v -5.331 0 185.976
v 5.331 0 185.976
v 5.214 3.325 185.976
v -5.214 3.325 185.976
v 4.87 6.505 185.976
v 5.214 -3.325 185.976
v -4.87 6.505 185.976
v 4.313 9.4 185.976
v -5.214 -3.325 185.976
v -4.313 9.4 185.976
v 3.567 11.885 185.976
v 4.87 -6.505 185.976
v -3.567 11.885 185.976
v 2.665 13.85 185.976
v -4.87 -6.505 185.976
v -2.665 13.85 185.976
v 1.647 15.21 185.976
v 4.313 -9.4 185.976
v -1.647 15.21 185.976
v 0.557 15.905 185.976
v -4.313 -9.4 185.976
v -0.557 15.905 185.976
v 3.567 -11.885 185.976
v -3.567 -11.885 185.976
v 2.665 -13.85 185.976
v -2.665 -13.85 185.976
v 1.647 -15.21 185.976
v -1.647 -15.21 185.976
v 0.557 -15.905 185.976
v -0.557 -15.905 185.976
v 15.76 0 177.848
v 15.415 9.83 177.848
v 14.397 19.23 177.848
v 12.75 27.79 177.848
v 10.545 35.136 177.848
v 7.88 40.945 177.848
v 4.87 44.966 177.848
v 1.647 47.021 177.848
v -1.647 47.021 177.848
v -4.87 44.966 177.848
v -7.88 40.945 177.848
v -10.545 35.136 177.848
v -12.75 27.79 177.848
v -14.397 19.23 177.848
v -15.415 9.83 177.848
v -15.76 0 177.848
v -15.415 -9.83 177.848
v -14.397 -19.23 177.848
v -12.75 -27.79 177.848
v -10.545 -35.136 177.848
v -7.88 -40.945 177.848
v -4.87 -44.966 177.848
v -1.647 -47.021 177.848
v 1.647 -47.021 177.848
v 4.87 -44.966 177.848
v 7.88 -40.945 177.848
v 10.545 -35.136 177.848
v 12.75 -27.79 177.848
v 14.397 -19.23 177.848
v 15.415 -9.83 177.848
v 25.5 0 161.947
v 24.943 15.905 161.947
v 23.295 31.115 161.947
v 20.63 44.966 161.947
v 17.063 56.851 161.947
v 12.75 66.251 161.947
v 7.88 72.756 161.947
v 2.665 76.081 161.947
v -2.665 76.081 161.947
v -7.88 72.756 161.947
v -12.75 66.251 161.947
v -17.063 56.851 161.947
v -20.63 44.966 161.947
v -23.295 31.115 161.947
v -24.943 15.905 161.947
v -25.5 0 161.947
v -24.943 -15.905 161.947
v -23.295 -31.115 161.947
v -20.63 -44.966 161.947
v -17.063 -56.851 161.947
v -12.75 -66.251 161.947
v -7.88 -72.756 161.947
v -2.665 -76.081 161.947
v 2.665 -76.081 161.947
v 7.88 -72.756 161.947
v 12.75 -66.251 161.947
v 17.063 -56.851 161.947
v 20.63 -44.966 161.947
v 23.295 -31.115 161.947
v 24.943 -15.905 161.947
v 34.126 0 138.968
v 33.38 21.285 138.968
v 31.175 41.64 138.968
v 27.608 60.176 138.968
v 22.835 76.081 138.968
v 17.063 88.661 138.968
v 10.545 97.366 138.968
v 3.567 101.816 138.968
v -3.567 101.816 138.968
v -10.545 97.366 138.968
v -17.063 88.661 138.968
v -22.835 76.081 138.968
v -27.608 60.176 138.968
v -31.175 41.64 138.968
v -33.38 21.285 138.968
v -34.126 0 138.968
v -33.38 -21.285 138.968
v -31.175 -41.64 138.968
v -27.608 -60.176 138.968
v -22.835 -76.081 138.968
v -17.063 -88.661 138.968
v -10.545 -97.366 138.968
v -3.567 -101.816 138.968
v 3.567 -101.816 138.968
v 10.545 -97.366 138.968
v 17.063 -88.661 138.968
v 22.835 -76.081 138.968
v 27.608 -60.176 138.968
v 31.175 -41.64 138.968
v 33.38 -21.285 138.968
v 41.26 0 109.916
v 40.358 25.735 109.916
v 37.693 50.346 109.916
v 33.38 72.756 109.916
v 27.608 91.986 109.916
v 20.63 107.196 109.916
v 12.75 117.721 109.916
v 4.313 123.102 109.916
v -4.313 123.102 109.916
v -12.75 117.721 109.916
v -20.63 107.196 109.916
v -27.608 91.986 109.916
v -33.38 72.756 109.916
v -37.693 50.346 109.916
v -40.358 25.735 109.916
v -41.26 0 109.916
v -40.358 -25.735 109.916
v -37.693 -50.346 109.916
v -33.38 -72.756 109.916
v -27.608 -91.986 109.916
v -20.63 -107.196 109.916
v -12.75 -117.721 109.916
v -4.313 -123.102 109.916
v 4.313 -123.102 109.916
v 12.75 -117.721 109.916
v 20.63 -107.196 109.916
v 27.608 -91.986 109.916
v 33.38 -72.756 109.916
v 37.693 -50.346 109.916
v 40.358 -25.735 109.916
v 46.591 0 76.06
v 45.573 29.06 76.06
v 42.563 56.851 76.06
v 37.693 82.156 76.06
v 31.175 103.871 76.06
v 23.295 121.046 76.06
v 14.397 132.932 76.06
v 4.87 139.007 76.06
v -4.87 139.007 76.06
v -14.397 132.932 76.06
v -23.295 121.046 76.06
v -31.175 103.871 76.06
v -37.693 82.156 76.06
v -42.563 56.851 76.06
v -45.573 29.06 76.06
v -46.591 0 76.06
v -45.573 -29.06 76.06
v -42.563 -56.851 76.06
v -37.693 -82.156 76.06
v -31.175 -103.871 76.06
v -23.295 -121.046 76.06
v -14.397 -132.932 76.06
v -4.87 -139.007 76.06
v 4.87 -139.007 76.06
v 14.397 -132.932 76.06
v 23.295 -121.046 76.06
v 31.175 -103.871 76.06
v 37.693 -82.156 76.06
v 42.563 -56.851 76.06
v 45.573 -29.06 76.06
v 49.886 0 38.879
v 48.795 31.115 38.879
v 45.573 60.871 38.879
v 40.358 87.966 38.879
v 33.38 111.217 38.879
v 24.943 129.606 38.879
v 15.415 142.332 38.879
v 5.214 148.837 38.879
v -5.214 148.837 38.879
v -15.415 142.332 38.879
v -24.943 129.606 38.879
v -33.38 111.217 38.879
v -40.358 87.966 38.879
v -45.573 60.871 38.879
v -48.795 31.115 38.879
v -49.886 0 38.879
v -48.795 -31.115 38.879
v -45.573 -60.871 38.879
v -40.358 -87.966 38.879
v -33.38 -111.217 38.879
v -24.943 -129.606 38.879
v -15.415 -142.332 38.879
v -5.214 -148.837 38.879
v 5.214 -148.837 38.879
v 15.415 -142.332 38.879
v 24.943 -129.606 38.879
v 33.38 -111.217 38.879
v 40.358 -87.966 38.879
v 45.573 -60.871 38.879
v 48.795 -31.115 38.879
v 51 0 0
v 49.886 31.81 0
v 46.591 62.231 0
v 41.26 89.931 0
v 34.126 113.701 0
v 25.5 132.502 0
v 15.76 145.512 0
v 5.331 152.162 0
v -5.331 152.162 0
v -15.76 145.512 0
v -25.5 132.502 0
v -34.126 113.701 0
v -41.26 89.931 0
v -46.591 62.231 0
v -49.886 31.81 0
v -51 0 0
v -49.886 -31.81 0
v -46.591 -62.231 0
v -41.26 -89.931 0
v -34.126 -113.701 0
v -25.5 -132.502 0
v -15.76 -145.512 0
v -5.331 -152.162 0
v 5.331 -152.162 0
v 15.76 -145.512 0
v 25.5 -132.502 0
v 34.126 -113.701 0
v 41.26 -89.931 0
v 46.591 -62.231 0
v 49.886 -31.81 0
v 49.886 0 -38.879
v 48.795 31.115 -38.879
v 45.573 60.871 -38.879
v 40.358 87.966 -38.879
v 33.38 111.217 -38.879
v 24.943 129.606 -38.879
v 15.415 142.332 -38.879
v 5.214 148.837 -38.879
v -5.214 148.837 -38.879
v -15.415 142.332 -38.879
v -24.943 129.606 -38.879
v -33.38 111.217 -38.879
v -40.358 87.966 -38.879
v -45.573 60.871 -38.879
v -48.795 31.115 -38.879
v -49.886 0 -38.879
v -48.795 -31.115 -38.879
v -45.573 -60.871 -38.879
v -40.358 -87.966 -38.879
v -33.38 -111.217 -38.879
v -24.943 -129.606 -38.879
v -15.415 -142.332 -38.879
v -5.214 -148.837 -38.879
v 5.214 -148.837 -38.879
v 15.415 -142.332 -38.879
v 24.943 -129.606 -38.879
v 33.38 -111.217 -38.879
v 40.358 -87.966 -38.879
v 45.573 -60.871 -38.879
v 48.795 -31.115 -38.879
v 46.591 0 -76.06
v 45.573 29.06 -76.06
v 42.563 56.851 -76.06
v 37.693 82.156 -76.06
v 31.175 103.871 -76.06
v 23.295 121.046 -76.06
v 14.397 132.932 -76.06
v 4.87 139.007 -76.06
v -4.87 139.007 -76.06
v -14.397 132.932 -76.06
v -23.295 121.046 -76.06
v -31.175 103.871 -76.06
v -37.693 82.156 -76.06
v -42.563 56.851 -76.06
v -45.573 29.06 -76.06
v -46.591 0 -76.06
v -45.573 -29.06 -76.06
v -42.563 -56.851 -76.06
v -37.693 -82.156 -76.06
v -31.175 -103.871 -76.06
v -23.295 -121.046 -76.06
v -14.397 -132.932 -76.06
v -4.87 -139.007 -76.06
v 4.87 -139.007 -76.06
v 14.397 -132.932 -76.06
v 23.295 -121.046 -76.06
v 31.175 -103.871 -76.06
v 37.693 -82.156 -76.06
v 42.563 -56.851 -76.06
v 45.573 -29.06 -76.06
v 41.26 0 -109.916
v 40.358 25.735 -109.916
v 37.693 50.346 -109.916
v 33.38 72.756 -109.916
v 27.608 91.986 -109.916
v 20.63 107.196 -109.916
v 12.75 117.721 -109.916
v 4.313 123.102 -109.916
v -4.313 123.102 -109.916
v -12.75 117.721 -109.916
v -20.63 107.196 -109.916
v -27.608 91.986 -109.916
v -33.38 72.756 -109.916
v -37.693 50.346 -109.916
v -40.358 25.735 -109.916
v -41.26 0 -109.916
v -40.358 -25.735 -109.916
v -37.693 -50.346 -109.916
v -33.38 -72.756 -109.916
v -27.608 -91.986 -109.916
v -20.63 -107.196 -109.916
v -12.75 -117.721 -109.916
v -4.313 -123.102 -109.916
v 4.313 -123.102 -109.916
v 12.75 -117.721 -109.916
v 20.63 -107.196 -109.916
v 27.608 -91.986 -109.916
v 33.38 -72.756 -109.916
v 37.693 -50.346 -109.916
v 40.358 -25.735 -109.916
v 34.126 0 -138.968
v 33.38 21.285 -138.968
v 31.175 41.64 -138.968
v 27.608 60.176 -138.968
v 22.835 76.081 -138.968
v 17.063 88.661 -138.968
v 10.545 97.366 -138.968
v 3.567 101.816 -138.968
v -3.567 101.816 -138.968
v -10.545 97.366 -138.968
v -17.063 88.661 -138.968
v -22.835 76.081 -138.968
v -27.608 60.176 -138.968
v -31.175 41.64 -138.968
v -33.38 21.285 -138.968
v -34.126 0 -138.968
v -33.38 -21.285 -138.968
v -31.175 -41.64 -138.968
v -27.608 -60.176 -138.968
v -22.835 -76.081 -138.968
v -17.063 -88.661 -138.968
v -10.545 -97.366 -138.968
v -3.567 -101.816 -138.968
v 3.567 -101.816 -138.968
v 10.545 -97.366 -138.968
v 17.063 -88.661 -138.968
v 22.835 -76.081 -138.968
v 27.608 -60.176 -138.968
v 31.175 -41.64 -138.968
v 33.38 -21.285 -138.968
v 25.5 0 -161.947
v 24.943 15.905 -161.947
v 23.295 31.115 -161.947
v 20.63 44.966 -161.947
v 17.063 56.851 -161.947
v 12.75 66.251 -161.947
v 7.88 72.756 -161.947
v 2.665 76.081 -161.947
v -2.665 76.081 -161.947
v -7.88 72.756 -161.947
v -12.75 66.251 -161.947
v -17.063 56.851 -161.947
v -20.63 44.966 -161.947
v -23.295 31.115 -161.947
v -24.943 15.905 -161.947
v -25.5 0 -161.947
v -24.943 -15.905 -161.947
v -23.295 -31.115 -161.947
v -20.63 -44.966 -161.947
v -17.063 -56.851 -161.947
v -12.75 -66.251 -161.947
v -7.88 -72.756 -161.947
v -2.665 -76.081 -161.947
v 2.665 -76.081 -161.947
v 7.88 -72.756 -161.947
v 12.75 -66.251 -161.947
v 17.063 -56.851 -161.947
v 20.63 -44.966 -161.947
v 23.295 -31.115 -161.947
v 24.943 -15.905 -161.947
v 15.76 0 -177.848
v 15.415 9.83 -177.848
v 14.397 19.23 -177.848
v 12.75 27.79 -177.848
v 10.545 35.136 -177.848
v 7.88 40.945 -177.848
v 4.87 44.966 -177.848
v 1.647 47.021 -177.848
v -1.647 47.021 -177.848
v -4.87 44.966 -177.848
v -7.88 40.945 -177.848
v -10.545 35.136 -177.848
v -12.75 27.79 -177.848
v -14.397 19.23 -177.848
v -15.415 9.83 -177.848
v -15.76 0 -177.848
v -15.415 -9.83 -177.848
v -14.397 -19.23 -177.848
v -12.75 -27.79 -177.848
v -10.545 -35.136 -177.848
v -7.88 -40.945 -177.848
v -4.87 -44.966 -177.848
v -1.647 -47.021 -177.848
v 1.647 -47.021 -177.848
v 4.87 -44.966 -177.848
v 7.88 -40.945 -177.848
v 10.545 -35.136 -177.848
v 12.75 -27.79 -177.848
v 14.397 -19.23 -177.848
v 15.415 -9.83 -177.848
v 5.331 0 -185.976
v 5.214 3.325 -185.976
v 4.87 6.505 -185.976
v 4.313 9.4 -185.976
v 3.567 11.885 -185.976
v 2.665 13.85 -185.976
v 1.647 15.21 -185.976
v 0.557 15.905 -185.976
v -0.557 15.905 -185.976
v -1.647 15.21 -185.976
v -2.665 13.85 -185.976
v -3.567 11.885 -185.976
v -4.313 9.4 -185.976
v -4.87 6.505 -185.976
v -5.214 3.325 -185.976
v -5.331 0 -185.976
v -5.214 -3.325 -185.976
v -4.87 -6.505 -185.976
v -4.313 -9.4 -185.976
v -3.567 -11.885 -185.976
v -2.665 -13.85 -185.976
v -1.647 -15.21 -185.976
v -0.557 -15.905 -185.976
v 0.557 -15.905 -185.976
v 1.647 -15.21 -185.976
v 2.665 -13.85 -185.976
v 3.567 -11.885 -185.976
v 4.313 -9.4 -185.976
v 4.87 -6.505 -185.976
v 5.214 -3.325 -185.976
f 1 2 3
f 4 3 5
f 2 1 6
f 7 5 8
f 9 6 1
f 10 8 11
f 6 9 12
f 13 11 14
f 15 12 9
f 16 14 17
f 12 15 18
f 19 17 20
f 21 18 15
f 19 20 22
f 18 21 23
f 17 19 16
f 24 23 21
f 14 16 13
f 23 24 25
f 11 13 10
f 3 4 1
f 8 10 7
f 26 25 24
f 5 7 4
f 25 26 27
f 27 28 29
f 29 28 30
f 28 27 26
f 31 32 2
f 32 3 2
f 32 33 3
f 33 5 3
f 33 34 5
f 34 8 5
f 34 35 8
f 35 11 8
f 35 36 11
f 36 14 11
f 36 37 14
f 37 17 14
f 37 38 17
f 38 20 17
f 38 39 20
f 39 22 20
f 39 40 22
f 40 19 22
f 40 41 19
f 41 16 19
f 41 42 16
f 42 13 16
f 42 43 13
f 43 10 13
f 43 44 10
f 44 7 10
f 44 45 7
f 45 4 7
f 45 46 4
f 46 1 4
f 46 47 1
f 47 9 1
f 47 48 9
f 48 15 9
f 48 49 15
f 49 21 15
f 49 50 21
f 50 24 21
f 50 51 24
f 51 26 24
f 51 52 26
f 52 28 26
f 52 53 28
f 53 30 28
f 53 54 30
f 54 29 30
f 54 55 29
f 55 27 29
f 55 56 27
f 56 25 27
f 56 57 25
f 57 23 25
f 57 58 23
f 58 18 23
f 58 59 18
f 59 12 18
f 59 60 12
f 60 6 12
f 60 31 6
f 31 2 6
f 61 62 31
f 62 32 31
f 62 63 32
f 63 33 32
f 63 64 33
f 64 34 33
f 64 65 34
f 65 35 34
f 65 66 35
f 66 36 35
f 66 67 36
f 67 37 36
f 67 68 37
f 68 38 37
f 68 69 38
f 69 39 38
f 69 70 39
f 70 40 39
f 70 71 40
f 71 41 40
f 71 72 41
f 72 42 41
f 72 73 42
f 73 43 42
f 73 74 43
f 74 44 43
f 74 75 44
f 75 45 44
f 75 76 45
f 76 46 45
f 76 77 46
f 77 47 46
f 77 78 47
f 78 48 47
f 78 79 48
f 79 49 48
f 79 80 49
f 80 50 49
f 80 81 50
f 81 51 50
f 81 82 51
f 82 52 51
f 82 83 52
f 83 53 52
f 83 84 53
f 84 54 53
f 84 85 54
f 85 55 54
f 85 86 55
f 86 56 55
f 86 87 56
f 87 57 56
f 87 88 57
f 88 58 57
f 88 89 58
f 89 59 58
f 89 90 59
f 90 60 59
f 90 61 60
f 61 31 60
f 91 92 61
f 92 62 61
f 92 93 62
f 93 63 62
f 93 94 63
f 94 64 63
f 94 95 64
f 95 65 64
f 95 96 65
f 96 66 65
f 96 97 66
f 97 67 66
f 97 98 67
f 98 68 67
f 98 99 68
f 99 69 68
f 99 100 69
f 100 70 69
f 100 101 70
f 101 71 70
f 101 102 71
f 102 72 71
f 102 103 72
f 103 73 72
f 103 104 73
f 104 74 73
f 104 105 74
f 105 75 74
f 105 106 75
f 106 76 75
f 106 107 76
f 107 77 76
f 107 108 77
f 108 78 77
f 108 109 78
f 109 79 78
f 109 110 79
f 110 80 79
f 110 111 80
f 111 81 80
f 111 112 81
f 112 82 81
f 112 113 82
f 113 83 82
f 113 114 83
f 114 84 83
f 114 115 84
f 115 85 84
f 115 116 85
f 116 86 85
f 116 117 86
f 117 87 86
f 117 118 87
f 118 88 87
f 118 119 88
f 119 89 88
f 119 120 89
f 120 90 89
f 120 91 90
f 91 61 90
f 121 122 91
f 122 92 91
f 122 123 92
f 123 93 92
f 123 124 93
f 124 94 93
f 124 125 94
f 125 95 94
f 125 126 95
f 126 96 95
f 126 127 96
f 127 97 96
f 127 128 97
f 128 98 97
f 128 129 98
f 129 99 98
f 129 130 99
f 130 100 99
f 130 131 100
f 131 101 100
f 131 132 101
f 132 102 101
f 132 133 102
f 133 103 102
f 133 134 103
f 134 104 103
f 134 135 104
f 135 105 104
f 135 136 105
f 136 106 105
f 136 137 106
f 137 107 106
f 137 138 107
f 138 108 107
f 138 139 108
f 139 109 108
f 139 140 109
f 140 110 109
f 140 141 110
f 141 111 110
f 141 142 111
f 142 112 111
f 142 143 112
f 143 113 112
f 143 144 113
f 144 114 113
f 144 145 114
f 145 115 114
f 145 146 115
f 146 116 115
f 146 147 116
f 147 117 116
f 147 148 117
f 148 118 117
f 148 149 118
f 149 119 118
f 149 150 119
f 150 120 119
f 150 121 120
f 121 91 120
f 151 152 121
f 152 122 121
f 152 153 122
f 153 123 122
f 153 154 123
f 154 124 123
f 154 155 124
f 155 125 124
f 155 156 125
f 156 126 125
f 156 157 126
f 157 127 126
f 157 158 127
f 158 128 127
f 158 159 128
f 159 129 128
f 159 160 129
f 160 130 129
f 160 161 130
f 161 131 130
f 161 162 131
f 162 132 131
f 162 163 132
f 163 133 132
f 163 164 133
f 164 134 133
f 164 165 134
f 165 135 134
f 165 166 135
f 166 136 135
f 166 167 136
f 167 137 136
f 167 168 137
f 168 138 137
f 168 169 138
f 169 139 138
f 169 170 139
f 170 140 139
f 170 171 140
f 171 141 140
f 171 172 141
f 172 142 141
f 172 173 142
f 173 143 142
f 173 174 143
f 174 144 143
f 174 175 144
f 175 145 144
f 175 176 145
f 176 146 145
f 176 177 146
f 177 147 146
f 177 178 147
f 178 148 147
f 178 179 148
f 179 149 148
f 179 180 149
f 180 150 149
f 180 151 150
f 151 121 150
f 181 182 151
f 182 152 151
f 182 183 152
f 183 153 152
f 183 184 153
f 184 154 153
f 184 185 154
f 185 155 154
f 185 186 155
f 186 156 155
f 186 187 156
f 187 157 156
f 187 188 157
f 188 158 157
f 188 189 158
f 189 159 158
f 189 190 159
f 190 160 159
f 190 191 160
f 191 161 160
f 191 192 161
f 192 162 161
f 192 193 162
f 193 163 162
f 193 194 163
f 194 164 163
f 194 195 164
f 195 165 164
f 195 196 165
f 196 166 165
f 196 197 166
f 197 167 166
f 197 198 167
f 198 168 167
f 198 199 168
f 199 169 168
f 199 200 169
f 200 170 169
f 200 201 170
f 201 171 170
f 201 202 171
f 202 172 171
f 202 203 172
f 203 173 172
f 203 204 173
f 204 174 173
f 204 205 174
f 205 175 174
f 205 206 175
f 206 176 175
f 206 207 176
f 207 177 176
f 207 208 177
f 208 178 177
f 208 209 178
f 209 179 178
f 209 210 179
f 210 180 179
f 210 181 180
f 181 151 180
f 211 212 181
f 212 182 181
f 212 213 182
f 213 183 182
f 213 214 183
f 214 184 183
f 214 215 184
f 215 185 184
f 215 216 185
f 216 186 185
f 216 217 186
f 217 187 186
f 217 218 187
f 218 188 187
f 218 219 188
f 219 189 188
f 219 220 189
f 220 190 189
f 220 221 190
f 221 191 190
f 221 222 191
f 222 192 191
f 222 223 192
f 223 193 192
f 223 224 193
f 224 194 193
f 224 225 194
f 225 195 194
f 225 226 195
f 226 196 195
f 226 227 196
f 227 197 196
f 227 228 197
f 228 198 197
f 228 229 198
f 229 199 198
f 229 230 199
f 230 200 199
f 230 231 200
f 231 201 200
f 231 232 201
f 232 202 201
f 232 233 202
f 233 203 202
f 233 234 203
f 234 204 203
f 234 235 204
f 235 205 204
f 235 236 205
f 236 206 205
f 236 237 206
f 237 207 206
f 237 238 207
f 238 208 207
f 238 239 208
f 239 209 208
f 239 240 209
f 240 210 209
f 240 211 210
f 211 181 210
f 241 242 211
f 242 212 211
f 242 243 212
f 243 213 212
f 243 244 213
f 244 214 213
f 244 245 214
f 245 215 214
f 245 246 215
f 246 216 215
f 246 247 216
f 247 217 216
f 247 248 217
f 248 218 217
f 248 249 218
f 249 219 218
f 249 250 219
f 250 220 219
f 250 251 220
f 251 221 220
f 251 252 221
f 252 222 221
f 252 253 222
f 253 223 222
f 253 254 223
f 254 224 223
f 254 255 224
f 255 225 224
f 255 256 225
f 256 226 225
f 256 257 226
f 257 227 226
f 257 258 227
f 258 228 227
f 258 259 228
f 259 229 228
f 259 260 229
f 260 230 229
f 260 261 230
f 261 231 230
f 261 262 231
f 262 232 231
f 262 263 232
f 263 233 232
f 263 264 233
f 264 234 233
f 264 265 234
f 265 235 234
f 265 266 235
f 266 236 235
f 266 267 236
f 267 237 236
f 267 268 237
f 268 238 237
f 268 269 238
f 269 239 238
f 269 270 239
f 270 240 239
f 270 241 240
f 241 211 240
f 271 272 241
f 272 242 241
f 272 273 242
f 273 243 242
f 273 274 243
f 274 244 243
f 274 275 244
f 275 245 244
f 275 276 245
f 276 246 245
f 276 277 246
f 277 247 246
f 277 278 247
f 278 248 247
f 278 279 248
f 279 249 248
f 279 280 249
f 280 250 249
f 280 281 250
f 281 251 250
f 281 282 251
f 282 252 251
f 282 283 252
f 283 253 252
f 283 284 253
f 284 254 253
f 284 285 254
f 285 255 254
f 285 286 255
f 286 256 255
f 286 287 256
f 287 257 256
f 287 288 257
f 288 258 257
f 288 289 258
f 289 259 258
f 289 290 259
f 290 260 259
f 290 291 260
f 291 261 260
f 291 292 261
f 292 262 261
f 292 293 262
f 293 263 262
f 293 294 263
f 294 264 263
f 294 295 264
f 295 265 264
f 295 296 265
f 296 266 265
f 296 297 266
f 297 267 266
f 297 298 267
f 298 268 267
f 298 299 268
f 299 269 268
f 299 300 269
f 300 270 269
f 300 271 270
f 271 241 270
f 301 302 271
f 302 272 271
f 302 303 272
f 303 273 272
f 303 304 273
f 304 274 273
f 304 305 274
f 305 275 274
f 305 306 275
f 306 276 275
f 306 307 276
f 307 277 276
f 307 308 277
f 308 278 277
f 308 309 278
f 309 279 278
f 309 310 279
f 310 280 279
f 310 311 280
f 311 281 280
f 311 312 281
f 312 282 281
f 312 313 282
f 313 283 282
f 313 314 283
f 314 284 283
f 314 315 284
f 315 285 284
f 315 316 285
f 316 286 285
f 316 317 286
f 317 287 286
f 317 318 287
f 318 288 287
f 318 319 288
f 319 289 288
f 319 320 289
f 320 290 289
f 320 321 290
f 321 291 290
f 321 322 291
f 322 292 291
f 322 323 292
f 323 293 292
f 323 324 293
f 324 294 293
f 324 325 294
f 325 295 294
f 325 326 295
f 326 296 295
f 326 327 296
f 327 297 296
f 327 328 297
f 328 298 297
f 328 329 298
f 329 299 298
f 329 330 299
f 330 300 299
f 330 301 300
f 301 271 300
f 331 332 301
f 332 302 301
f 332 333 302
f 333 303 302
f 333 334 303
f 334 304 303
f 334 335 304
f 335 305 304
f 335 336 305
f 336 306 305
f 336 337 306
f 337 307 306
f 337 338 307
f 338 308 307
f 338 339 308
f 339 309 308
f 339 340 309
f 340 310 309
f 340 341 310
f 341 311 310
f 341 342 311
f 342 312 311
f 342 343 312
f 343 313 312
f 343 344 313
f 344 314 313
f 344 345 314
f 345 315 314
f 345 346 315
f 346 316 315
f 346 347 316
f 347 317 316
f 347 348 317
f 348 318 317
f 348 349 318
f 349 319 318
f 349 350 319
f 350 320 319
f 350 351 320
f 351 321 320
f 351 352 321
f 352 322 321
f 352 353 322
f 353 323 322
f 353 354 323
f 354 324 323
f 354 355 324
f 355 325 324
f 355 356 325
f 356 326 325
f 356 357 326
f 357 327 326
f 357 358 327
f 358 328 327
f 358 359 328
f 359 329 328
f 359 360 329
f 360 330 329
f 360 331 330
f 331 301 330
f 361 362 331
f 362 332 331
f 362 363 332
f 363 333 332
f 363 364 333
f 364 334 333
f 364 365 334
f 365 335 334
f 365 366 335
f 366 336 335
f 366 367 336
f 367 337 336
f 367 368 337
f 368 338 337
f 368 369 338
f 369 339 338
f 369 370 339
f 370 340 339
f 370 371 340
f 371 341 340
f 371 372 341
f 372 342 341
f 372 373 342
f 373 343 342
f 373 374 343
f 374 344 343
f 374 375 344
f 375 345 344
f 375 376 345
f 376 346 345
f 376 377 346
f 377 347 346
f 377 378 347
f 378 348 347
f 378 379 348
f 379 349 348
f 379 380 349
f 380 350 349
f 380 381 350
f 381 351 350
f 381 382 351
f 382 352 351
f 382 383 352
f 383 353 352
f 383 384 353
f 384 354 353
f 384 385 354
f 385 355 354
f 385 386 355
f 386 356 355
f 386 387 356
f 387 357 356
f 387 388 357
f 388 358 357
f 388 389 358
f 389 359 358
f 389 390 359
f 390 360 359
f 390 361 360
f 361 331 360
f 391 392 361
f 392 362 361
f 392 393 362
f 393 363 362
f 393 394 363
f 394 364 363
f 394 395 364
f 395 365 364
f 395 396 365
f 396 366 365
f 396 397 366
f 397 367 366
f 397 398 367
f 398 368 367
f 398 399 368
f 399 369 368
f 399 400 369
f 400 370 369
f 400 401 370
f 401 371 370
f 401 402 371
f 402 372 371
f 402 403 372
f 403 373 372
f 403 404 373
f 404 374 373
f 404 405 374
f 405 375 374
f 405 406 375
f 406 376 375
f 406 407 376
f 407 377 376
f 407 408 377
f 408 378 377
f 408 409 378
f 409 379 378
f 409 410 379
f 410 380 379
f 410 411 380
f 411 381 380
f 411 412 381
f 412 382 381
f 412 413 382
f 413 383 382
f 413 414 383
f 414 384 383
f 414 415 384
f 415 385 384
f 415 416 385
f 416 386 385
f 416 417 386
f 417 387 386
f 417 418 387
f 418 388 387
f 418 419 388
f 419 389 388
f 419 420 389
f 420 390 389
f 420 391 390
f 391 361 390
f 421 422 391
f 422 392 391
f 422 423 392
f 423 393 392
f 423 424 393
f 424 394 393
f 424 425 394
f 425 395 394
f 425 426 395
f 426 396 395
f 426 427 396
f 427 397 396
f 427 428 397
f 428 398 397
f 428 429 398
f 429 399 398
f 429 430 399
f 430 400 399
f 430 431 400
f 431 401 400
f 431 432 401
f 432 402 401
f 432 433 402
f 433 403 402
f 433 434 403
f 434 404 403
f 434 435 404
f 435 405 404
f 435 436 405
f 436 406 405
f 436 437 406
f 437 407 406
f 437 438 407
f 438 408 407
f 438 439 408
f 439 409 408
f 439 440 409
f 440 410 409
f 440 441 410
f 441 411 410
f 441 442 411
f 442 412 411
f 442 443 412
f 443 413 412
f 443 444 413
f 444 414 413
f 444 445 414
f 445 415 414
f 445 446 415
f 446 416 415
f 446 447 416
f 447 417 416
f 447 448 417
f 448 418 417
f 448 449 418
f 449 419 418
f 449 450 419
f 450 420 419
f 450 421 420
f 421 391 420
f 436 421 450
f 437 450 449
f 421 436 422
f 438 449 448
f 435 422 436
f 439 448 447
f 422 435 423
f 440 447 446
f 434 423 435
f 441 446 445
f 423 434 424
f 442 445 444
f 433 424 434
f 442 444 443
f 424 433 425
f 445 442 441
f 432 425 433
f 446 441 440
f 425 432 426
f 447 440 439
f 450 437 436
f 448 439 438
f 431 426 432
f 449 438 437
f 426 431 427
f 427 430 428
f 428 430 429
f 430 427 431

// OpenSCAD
// Generated by SolidPython 1.0.1 on 2020-07-29 00:39:25


scale(v = [3, 9, 11]) {
	sphere(r = 17);
}
/***********************************************
*********      SolidPython code:      **********
************************************************
 
# import packages: SolidPython
from solid import *
from solid.utils import *
from itertools import chain, combinations


class Resize:

    def __init__(self, scad_file):
        self.scad_file = scad_file
        #self.scad_file = import_scad(scad_file)
        # cone/cylinder param:
        self.r1 = 0
        self.r2 = 0
        self.h = 0
        # rectangular prism param:
        self.w = 0
        self.l = 0
        # ellipse param:
        self.r = 0

    # import OpenScad code (file name corresponds to shape)


    # classify shape + parameters
    def assign(self, param1, param2, param3):
        if self.scad_file == 'cone.scad':
            self.r1 = param1
            self.r2 = param2
            self.h = param3
        elif self.scad_file == 'cylinder.scad':
            self.r1 = param1
            self.r2 = param2
            self.h = param3
        elif self.scad_file == 'rectangularPrism.scad':
            self.h = param1
            self.l = param2
            self.w = param3
        else:
            self.r = param1
            self.h = param2

    # resize parameters
    def iterate(self):
        x = range(3, 20, 2)
        i = 1
        if self.scad_file == 'cone.scad':
            tempList = list(combinations(x, 2))
            for temp in tempList:
                param1 = temp[0]
                param2 = temp[1]
                filepath = 'produced_scad_files/' + 'cone' + str(param1) + '_' + str(param2) + '_' + '.scad'
                scad_render_to_file(cylinder(h=param1, r1=param2, r2=0), filepath)

        elif self.scad_file == 'cylinder.scad':
            tempList = list(combinations(x, 3))
            for temp in tempList:
                param1 = temp[0]
                param2 = temp[1]
                filepath = 'produced_scad_files/' + 'cylinder' + str(param1) + '_' + str(param2) + '_' + '.scad'
                scad_render_to_file(cylinder(h=param1, r1=param2, r2=param2), filepath)

        elif self.scad_file == 'rectangularPrism.scad':
            tempList = list(combinations(x, 3))
            for temp in tempList:
                param1 = temp[0]
                param2 = temp[1]
                param3 = temp[2]
                filepath = 'produced_scad_files/' + 'rectangularPrism' + str(param1) + '_' + str(param2) + '_' + str(
                    param3) + '.scad'
                scad_render_to_file(cube(size=(param1, param2, param3)), filepath)

        elif self.scad_file == 'ellipse.scad':
            tempList = list(combinations(x, 4))
            for temp in tempList:
                param1 = temp[0]
                param2 = temp[1]
                param3 = temp[2]
                param4 = temp[3]
                filepath = 'produced_scad_files/' + 'ellipse' + str(param1) + '_' + str(param2) + '_' + str(param3) + '_' + str(param4) + '.scad'
                scad_render_to_file(scale([param1, param2, param3])(sphere(r=param4)), filepath)

    def render_to_scadfile(self):
        scad_render_to_file(scad, 'example.scad') 
 
************************************************/
